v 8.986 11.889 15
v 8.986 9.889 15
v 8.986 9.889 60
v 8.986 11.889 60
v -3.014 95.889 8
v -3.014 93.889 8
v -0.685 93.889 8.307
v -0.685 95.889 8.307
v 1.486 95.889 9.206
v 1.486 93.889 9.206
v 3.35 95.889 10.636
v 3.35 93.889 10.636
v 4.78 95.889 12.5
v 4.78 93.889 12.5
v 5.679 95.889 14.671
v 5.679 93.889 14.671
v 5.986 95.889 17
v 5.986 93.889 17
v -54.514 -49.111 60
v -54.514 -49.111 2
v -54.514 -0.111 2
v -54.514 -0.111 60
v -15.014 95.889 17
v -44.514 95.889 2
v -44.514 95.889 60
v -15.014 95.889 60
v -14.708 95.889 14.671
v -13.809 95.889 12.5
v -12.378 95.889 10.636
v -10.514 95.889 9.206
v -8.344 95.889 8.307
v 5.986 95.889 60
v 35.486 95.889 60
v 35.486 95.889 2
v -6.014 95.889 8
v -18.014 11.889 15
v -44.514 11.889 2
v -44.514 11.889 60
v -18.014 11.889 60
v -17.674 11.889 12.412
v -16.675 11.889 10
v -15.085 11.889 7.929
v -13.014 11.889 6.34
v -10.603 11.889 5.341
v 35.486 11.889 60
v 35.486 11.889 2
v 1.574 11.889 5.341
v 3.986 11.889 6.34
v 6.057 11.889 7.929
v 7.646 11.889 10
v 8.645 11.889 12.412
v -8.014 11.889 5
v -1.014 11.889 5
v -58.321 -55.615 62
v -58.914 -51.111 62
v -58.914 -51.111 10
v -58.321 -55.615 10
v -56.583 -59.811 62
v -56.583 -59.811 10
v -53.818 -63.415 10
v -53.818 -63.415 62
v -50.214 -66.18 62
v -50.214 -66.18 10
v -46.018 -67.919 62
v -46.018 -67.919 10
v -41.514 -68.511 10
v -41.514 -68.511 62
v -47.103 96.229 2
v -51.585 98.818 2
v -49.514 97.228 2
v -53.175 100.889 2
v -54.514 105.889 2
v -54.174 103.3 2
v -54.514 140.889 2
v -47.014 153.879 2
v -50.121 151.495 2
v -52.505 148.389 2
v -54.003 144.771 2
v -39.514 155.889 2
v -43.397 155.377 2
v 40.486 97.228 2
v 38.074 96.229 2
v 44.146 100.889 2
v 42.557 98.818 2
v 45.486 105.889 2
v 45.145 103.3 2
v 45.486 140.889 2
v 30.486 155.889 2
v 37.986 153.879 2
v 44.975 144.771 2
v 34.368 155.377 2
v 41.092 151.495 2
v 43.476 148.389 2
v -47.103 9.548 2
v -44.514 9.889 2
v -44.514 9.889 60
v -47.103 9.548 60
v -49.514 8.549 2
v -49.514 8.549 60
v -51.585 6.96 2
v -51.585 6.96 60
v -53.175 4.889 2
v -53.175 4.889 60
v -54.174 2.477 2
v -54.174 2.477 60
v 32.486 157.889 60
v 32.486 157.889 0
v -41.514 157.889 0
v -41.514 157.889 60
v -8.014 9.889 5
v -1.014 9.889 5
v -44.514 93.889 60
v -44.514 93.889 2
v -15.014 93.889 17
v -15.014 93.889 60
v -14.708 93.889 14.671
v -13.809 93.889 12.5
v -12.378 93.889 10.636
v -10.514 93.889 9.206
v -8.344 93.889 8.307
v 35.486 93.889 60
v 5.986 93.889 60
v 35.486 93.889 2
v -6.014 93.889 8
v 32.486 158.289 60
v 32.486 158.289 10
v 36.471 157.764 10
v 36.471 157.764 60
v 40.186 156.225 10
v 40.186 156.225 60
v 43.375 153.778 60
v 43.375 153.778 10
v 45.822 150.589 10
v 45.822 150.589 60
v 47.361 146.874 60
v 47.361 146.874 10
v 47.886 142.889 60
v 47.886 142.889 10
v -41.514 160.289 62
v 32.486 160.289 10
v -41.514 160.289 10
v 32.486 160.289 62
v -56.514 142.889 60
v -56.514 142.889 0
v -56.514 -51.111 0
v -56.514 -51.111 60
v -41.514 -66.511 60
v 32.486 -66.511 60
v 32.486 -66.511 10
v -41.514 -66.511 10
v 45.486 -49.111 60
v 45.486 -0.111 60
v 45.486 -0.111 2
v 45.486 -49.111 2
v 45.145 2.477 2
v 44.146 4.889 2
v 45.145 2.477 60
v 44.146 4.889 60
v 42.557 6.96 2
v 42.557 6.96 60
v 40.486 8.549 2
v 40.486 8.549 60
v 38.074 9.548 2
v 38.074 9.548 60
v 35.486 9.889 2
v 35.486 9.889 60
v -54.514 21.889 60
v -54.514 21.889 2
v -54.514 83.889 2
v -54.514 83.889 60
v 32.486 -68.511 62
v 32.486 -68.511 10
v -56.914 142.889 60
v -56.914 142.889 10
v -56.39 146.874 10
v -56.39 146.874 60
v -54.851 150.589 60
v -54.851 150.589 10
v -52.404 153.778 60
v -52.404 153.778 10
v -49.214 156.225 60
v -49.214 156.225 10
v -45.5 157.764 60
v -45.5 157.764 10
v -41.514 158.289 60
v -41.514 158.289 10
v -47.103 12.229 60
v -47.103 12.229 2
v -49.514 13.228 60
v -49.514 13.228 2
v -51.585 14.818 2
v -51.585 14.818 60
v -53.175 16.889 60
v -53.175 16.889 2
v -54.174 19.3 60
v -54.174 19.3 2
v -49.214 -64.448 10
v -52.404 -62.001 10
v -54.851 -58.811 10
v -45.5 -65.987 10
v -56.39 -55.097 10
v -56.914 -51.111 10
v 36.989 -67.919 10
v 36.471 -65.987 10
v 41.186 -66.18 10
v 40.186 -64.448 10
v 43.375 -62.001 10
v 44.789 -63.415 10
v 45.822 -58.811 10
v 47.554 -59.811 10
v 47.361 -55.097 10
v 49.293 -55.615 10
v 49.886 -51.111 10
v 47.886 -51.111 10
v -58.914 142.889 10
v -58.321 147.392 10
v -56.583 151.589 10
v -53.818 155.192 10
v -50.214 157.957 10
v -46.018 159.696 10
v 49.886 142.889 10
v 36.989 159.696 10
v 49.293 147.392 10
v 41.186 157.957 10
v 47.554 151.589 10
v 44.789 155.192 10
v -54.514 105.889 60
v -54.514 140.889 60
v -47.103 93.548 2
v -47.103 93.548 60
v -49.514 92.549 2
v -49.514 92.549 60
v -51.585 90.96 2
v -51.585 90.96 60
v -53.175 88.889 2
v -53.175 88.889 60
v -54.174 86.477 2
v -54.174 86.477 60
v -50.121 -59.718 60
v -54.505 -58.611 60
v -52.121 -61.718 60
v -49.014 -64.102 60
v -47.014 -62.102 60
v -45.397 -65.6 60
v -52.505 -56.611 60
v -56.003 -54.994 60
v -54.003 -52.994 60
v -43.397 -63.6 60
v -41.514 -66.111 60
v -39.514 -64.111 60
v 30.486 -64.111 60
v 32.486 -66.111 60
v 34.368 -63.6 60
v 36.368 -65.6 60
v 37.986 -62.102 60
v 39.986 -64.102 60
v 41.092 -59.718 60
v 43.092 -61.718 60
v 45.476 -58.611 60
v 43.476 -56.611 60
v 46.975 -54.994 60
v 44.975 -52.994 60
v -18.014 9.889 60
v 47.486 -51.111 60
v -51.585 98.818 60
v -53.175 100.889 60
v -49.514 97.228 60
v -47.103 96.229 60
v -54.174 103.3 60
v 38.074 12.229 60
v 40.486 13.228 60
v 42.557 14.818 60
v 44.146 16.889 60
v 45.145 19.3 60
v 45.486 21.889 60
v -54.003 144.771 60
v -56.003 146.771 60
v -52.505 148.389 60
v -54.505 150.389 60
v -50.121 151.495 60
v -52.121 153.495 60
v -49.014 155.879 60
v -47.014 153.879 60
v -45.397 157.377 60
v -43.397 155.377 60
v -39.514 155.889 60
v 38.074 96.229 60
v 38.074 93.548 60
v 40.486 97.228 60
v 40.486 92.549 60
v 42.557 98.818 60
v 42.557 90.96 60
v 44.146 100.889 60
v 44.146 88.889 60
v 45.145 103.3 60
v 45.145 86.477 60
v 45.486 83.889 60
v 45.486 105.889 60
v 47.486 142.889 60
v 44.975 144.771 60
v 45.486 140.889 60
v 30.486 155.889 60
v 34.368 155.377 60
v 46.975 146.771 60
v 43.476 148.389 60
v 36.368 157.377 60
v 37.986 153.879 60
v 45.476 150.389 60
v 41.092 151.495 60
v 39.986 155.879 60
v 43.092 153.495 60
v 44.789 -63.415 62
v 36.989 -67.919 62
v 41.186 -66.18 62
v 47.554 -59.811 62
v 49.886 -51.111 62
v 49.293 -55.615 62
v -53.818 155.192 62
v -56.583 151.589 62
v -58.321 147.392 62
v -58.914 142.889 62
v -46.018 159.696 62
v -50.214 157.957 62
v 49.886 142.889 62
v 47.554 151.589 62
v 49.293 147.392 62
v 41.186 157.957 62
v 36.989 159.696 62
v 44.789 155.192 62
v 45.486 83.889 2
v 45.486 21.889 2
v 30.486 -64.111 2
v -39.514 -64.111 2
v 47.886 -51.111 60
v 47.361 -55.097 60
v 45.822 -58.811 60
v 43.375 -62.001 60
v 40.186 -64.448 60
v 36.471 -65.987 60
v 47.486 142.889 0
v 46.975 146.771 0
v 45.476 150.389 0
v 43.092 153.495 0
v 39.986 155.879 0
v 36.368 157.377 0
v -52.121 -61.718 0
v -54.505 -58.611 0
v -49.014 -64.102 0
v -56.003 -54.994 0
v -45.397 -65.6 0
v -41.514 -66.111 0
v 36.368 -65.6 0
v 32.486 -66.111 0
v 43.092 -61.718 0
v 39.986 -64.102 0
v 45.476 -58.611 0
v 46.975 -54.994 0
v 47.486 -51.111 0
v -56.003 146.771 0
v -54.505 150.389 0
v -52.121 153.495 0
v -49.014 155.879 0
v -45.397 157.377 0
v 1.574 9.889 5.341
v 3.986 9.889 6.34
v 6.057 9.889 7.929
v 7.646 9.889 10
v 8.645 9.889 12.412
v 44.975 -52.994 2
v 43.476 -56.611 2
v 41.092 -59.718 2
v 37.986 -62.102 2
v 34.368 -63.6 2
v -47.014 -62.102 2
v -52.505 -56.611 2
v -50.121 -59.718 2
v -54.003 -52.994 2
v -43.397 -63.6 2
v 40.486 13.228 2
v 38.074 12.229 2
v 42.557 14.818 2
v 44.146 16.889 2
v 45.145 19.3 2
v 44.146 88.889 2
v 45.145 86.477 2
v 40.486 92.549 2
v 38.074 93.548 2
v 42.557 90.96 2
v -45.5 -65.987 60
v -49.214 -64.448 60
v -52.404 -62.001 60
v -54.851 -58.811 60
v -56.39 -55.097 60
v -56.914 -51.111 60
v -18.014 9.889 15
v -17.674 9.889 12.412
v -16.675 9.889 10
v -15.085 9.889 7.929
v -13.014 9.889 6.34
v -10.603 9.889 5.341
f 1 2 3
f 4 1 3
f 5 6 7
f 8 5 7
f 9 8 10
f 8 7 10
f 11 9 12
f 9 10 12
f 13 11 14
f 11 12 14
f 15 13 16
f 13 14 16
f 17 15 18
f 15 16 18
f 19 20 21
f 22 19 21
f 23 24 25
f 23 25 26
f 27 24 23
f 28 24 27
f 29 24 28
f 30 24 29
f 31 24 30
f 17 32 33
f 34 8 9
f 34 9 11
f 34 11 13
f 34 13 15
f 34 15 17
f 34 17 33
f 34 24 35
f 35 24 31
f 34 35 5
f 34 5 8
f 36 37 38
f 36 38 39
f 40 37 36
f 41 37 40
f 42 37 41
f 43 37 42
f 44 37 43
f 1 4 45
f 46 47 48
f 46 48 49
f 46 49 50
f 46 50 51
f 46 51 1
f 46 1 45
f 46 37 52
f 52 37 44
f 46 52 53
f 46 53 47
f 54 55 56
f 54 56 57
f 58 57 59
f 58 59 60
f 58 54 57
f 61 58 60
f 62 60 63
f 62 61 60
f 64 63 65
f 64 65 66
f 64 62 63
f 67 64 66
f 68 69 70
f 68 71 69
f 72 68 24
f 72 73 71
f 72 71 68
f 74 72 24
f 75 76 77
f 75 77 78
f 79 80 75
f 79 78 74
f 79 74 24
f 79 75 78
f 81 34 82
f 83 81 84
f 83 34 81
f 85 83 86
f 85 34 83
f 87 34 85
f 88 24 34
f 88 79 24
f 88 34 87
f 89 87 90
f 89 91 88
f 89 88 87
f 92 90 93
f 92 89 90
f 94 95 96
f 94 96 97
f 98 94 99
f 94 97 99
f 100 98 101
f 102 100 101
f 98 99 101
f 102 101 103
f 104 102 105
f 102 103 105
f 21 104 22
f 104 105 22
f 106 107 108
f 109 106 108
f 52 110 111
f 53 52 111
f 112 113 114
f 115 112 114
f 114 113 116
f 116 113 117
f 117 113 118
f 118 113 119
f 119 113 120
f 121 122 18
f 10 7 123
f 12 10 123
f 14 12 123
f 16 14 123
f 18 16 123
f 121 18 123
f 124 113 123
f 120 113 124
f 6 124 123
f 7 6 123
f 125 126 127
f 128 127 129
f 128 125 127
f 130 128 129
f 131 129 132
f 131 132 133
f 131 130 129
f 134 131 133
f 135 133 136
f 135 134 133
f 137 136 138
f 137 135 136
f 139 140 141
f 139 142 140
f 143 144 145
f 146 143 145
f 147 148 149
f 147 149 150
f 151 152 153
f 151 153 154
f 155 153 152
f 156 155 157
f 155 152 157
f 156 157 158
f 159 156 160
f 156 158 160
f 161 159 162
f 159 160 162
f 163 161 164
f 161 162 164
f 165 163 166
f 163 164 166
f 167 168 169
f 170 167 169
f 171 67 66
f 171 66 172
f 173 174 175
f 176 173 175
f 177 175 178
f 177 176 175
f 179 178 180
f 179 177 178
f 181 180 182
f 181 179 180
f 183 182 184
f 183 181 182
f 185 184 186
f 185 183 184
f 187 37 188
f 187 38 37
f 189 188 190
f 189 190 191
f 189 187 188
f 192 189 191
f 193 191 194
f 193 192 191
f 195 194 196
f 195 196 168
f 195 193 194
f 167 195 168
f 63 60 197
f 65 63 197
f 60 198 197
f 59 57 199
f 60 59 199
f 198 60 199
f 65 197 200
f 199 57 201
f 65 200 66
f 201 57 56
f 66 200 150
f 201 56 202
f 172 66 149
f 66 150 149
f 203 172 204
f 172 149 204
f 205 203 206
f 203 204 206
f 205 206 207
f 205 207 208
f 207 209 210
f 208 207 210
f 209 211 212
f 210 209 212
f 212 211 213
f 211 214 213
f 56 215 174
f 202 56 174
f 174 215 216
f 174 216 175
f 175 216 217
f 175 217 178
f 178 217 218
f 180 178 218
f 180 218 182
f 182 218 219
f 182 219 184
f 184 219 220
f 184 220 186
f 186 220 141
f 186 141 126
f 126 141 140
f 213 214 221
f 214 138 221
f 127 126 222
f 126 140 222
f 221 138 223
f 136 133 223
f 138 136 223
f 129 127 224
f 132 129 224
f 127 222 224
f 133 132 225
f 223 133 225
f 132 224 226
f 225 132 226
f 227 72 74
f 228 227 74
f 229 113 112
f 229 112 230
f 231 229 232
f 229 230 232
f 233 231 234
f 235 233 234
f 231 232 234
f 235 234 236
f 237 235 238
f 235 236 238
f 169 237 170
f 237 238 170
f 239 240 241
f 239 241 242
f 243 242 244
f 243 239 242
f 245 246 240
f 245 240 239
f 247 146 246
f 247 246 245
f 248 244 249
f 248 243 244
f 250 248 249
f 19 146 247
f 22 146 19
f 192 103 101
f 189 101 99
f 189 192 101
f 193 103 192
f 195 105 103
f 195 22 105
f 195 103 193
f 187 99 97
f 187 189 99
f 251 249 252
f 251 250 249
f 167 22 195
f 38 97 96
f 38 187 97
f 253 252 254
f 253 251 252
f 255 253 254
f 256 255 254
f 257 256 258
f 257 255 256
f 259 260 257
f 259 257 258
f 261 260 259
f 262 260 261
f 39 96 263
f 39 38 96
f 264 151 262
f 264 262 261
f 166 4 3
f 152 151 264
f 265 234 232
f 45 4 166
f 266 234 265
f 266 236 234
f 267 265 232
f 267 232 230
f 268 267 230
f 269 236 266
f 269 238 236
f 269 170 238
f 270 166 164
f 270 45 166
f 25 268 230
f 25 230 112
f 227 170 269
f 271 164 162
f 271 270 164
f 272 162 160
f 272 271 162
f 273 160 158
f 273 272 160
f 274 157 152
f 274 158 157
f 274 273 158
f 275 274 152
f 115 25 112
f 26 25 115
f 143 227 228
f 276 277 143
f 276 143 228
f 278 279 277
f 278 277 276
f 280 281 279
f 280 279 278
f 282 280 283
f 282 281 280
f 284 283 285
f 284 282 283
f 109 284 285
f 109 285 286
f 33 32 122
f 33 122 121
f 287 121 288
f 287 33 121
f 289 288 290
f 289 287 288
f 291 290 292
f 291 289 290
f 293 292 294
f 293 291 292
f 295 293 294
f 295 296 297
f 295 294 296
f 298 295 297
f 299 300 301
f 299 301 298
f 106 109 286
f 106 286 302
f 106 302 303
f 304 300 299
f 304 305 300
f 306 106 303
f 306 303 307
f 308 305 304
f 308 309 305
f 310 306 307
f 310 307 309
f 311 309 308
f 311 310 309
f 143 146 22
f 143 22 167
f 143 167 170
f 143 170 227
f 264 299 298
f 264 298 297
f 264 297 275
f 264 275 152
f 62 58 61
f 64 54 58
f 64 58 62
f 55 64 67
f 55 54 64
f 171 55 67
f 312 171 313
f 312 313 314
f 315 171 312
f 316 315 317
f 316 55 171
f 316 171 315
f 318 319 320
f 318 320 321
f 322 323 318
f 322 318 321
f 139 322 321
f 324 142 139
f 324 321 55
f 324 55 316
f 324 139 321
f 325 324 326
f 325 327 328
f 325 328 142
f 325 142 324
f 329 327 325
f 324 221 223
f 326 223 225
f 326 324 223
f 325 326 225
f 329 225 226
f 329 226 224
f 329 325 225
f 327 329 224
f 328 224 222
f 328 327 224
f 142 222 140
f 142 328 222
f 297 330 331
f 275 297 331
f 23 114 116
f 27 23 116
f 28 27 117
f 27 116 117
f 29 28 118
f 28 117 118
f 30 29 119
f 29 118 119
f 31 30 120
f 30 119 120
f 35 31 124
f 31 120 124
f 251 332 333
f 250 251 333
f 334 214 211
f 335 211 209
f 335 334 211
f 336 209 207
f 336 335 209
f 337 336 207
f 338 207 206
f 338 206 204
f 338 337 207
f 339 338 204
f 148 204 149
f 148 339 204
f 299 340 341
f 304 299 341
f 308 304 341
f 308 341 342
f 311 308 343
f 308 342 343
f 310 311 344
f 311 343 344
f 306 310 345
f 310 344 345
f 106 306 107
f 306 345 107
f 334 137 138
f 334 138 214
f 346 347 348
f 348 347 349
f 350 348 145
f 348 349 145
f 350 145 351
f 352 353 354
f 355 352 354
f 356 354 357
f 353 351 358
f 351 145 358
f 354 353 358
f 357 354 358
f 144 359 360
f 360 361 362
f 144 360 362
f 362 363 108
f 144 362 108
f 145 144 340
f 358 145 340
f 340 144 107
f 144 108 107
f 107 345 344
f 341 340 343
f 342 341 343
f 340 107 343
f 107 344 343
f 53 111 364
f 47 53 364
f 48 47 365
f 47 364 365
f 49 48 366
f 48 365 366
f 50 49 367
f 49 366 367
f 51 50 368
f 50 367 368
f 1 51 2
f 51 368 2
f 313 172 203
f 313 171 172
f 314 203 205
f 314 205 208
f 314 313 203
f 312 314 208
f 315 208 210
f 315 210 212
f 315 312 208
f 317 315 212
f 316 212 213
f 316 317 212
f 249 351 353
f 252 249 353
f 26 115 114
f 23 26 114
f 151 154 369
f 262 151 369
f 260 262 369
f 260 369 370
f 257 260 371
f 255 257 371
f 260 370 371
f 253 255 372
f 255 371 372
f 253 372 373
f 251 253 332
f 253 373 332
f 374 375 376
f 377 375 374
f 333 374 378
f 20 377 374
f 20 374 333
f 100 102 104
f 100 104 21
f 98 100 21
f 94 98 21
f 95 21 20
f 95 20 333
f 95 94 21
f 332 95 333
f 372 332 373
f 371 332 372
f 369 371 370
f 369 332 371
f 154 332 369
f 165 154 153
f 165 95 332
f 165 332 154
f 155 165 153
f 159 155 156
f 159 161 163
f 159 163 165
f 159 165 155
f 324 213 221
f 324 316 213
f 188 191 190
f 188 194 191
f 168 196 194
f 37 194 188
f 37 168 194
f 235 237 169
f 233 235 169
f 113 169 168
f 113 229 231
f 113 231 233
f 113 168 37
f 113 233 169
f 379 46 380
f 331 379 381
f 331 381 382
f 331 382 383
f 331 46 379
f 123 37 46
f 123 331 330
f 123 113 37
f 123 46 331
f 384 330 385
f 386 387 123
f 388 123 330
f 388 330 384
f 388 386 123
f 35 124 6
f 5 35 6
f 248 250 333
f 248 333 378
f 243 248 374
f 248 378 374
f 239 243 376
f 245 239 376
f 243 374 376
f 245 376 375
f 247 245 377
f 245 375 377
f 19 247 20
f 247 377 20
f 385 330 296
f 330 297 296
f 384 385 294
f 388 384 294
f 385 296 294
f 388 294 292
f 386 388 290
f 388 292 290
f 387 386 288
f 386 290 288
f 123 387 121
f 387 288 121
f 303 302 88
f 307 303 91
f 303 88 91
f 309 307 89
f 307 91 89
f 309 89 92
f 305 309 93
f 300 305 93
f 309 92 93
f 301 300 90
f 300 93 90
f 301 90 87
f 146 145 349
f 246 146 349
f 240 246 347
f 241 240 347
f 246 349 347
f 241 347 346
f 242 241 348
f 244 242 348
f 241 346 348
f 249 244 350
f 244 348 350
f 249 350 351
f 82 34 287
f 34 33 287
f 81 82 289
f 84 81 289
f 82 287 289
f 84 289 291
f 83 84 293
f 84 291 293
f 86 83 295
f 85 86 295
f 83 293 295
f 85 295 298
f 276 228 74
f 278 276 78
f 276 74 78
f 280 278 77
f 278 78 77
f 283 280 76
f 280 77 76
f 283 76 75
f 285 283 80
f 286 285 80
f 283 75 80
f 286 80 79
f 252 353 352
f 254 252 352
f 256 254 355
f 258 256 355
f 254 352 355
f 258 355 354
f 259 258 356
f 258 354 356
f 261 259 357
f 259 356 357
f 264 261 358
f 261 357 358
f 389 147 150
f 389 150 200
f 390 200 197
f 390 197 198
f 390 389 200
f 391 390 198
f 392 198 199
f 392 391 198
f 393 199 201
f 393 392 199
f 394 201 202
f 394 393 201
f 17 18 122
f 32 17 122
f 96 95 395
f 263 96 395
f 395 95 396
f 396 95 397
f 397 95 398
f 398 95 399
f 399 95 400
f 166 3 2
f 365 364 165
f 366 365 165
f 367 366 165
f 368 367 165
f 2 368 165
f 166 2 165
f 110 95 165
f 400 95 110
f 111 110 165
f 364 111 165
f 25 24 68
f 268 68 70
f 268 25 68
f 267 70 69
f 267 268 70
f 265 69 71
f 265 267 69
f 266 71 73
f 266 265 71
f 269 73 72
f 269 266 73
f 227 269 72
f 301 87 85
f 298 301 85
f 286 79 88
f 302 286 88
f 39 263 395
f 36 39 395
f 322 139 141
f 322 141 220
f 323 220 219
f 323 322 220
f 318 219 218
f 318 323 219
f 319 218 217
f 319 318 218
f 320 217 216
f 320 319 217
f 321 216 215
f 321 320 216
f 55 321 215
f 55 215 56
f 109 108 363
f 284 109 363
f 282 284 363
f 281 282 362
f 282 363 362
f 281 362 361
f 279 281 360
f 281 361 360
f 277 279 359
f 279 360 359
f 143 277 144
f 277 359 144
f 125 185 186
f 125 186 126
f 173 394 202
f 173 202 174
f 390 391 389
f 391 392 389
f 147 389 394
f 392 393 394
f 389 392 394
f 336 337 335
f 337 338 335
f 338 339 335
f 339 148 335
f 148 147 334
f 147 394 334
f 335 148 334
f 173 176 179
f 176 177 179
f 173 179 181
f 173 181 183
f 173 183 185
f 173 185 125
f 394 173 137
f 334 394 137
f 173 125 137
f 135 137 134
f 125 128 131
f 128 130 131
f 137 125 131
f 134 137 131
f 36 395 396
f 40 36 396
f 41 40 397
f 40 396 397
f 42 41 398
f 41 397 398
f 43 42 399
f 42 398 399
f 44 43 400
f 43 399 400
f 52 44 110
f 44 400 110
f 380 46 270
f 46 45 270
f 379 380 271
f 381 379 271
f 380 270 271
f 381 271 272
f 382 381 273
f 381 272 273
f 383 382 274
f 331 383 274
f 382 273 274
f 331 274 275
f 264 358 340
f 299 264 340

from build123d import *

# Parameters (mm, degrees)
F0_W      = 100
F0_H      = 2
F1_DEPTH  = 60
F0_H_2    = 82
F2_DEPTH  = 2
F4_DEPTH  = 2
F6_DEPTH  = 2
F7_R      = 10
F9_DEPTH  = 2
F10_DEPTH = 50


with BuildPart() as f1:
    # F0 (on Top) → F1 (new body)
    with BuildSketch(Plane.XY):
        with BuildLine():
            ThreePointArc((-41.5143723786, 157.8886009157), (-52.1209740964, 153.4952026335), (-56.5143723786, 142.8886009157))
            Line((-56.5143723786, 142.8886009157), (-56.5143723786, -51.1113990843))
            ThreePointArc((-56.5143723786, -51.1113990843), (-52.1209740964, -61.7180008021), (-41.5143723786, -66.1113990843))
            Line((-41.5143723786, -66.1113990843), (32.4856276214, -66.1113990843))
            ThreePointArc((32.4856276214, -66.1113990843), (43.0922293392, -61.7180008021), (47.4856276214, -51.1113990843))
            Line((47.4856276214, -51.1113990843), (47.4856276214, 142.8886009157))
            ThreePointArc((47.4856276214, 142.8886009157), (43.0922293392, 153.4952026335), (32.4856276214, 157.8886009157))
            Line((32.4856276214, 157.8886009157), (-41.5143723786, 157.8886009157))
        make_face()
        with BuildLine():
            ThreePointArc((-54.5143723786, 140.8886009157), (-50.1209740964, 151.4952026335), (-39.5143723786, 155.8886009157))
            Line((-39.5143723786, 155.8886009157), (30.4856276214, 155.8886009157))
            ThreePointArc((30.4856276214, 155.8886009157), (41.0922293392, 151.4952026335), (45.4856276214, 140.8886009157))
            Line((45.4856276214, 140.8886009157), (45.4856276214, 95.8886009157))
            Line((45.4856276214, 95.8886009157), (45.4856276214, 93.8886009157))
            Line((45.4856276214, 93.8886009157), (45.4856276214, 11.8886009157))
            Line((45.4856276214, 11.8886009157), (45.4856276214, 9.8886009157))
            Line((45.4856276214, 9.8886009157), (45.4856276214, -49.1113990843))
            ThreePointArc((45.4856276214, -49.1113990843), (41.0922293392, -59.7180008021), (30.4856276214, -64.1113990843))
            Line((30.4856276214, -64.1113990843), (-39.5143723786, -64.1113990843))
            ThreePointArc((-39.5143723786, -64.1113990843), (-50.1209740964, -59.7180008021), (-54.5143723786, -49.1113990843))
            Line((-54.5143723786, -49.1113990843), (-54.5143723786, 9.8886009157))
            Line((-54.5143723786, 9.8886009157), (-54.5143723786, 11.8886009157))
            Line((-54.5143723786, 11.8886009157), (-54.5143723786, 93.8886009157))
            Line((-54.5143723786, 93.8886009157), (-54.5143723786, 95.8886009157))
            Line((-54.5143723786, 95.8886009157), (-54.5143723786, 140.8886009157))
        make_face(mode=Mode.SUBTRACT)
        with Locations((-4.5143723786, 94.8886009157)):
            Rectangle(F0_W, F0_H)
        with Locations((-4.5143723786, 10.8886009157)):
            Rectangle(F0_W, F0_H)
    extrude(amount=F1_DEPTH)

    # F0 (on Top) → F2 (join)
    with BuildSketch(Plane.XY):
        with BuildLine():
            Line((30.4856276214, 155.8886009157), (-39.5143723786, 155.8886009157))
            ThreePointArc((-39.5143723786, 155.8886009157), (-50.1209740964, 151.4952026335), (-54.5143723786, 140.8886009157))
            Line((-54.5143723786, 140.8886009157), (-54.5143723786, 95.8886009157))
            Line((-54.5143723786, 95.8886009157), (45.4856276214, 95.8886009157))
            Line((45.4856276214, 95.8886009157), (45.4856276214, 140.8886009157))
            ThreePointArc((45.4856276214, 140.8886009157), (41.0922293392, 151.4952026335), (30.4856276214, 155.8886009157))
        make_face()
        with Locations((-4.5143723786, 52.8886009157)):
            Rectangle(F0_W, F0_H_2)
        with BuildLine():
            Line((45.4856276214, 9.8886009157), (-54.5143723786, 9.8886009157))
            Line((-54.5143723786, 9.8886009157), (-54.5143723786, -49.1113990843))
            ThreePointArc((-54.5143723786, -49.1113990843), (-50.1209740964, -59.7180008021), (-39.5143723786, -64.1113990843))
            Line((-39.5143723786, -64.1113990843), (30.4856276214, -64.1113990843))
            ThreePointArc((30.4856276214, -64.1113990843), (41.0922293392, -59.7180008021), (45.4856276214, -49.1113990843))
            Line((45.4856276214, -49.1113990843), (45.4856276214, 9.8886009157))
        make_face()
    extrude(amount=F2_DEPTH)

    # F3 (on face) → F4 (cut, through all)
    with BuildSketch(Plane.XZ.offset(-9.8886009157)):
        with BuildLine():
            Line((8.9856276214, 60), (-18.0143723786, 60))
            Line((-18.0143723786, 60), (-18.0143723786, 15))
            ThreePointArc((-18.0143723786, 15), (-15.0854401905, 7.9289321881), (-8.0143723786, 5))
            Line((-8.0143723786, 5), (-1.0143723786, 5))
            ThreePointArc((-1.0143723786, 5), (6.0566954333, 7.9289321881), (8.9856276214, 15))
            Line((8.9856276214, 15), (8.9856276214, 60))
        make_face()
    extrude(amount=-F4_DEPTH, mode=Mode.SUBTRACT)

    # F5 (on face) → F6 (cut, through all)
    with BuildSketch(Plane.XZ.offset(-93.8886009157)):
        with BuildLine():
            Line((5.9856276214, 60), (-15.0143723786, 60))
            Line((-15.0143723786, 60), (-15.0143723786, 17))
            ThreePointArc((-15.0143723786, 17), (-12.3783334093, 10.6360389693), (-6.0143723786, 8))
            Line((-6.0143723786, 8), (-3.0143723786, 8))
            ThreePointArc((-3.0143723786, 8), (3.3495886521, 10.6360389693), (5.9856276214, 17))
            Line((5.9856276214, 17), (5.9856276214, 60))
        make_face()
    extrude(amount=-F6_DEPTH, mode=Mode.SUBTRACT)

    # F7
    f7_edges = [f1.edges().sort_by_distance(p)[0] for p in [
        (-54.514372, 9.888601, 31),
        (45.485628, 9.888601, 31),
        (-54.514372, 11.888601, 31),
        (45.485628, 11.888601, 31),
        (-54.514372, 93.888601, 31),
        (45.485628, 93.888601, 31),
        (45.485628, 95.888601, 31),
        (-54.514372, 95.888601, 31),
    ]]
    fillet(f7_edges, radius=F7_R)


with BuildPart() as f9:
    # F8 (on face) → F9 (new body)
    with BuildSketch(Plane.XY.offset(60)):
        with BuildLine():
            Line((32.4856276214, 160.2886009157), (-41.5143723786, 160.2886009157))
            ThreePointArc((-41.5143723786, 160.2886009157), (-53.8180303712, 155.1922589083), (-58.9143723786, 142.8886009157))
            Line((-58.9143723786, 142.8886009157), (-58.9143723786, -51.1113990843))
            ThreePointArc((-58.9143723786, -51.1113990843), (-53.8180303712, -63.415057077), (-41.5143723786, -68.5113990843))
            Line((-41.5143723786, -68.5113990843), (32.4856276214, -68.5113990843))
            ThreePointArc((32.4856276214, -68.5113990843), (44.7892856141, -63.415057077), (49.8856276214, -51.1113990843))
            Line((49.8856276214, -51.1113990843), (49.8856276214, 142.8886009157))
            ThreePointArc((49.8856276214, 142.8886009157), (44.7892856141, 155.1922589083), (32.4856276214, 160.2886009157))
        make_face()
        with BuildLine():
            ThreePointArc((-56.9143723786, 142.8886009157), (-52.4038168089, 153.7780453459), (-41.5143723786, 158.2886009157))
            Line((-41.5143723786, 158.2886009157), (32.4856276214, 158.2886009157))
            ThreePointArc((32.4856276214, 158.2886009157), (43.3750720517, 153.7780453459), (47.8856276214, 142.8886009157))
            Line((47.8856276214, 142.8886009157), (47.8856276214, -51.1113990843))
            ThreePointArc((47.8856276214, -51.1113990843), (43.3750720517, -62.0008435146), (32.4856276214, -66.5113990843))
            Line((32.4856276214, -66.5113990843), (-41.5143723786, -66.5113990843))
            ThreePointArc((-41.5143723786, -66.5113990843), (-52.4038168089, -62.0008435146), (-56.9143723786, -51.1113990843))
            Line((-56.9143723786, -51.1113990843), (-56.9143723786, 142.8886009157))
        make_face(mode=Mode.SUBTRACT)
        with BuildLine():
            Line((32.4856276214, 158.2886009157), (-41.5143723786, 158.2886009157))
            ThreePointArc((-41.5143723786, 158.2886009157), (-52.4038168089, 153.7780453459), (-56.9143723786, 142.8886009157))
            Line((-56.9143723786, 142.8886009157), (-56.9143723786, -51.1113990843))
            ThreePointArc((-56.9143723786, -51.1113990843), (-52.4038168089, -62.0008435146), (-41.5143723786, -66.5113990843))
            Line((-41.5143723786, -66.5113990843), (32.4856276214, -66.5113990843))
            ThreePointArc((32.4856276214, -66.5113990843), (43.3750720517, -62.0008435146), (47.8856276214, -51.1113990843))
            Line((47.8856276214, -51.1113990843), (47.8856276214, 142.8886009157))
            ThreePointArc((47.8856276214, 142.8886009157), (43.3750720517, 153.7780453459), (32.4856276214, 158.2886009157))
        make_face()
        with BuildLine():
            Line((-41.5143723786, 157.8886009157), (32.4856276214, 157.8886009157))
            ThreePointArc((32.4856276214, 157.8886009157), (43.0922293392, 153.4952026335), (47.4856276214, 142.8886009157))
            Line((47.4856276214, 142.8886009157), (47.4856276214, -51.1113990843))
            ThreePointArc((47.4856276214, -51.1113990843), (43.0922293392, -61.7180008021), (32.4856276214, -66.1113990843))
            Line((32.4856276214, -66.1113990843), (-41.5143723786, -66.1113990843))
            ThreePointArc((-41.5143723786, -66.1113990843), (-52.1209740964, -61.7180008021), (-56.5143723786, -51.1113990843))
            Line((-56.5143723786, -51.1113990843), (-56.5143723786, 142.8886009157))
            ThreePointArc((-56.5143723786, 142.8886009157), (-52.1209740964, 153.4952026335), (-41.5143723786, 157.8886009157))
        make_face(mode=Mode.SUBTRACT)
        with BuildLine():
            ThreePointArc((47.4856276214, 142.8886009157), (43.0922293392, 153.4952026335), (32.4856276214, 157.8886009157))
            Line((32.4856276214, 157.8886009157), (-41.5143723786, 157.8886009157))
            ThreePointArc((-41.5143723786, 157.8886009157), (-52.1209740964, 153.4952026335), (-56.5143723786, 142.8886009157))
            Line((-56.5143723786, 142.8886009157), (-56.5143723786, -51.1113990843))
            ThreePointArc((-56.5143723786, -51.1113990843), (-52.1209740964, -61.7180008021), (-41.5143723786, -66.1113990843))
            Line((-41.5143723786, -66.1113990843), (32.4856276214, -66.1113990843))
            ThreePointArc((32.4856276214, -66.1113990843), (43.0922293392, -61.7180008021), (47.4856276214, -51.1113990843))
            Line((47.4856276214, -51.1113990843), (47.4856276214, 142.8886009157))
        make_face()
        with BuildLine():
            ThreePointArc((35.4856276214, 9.8886009157), (42.5566954333, 6.9596687275), (45.4856276214, -0.1113990843))
            Line((45.4856276214, -0.1113990843), (45.4856276214, -49.1113990843))
            ThreePointArc((45.4856276214, -49.1113990843), (41.0922293392, -59.7180008021), (30.4856276214, -64.1113990843))
            Line((30.4856276214, -64.1113990843), (-39.5143723786, -64.1113990843))
            ThreePointArc((-39.5143723786, -64.1113990843), (-50.1209740964, -59.7180008021), (-54.5143723786, -49.1113990843))
            Line((-54.5143723786, -49.1113990843), (-54.5143723786, -0.1113990843))
            ThreePointArc((-54.5143723786, -0.1113990843), (-51.5854401905, 6.9596687275), (-44.5143723786, 9.8886009157))
            Line((-44.5143723786, 9.8886009157), (-18.0143723786, 9.8886009157))
            Line((-18.0143723786, 9.8886009157), (-18.0143723786, 11.8886009157))
            Line((-18.0143723786, 11.8886009157), (-44.5143723786, 11.8886009157))
            ThreePointArc((-44.5143723786, 11.8886009157), (-51.5854401905, 14.8175331038), (-54.5143723786, 21.8886009157))
            Line((-54.5143723786, 21.8886009157), (-54.5143723786, 83.8886009157))
            ThreePointArc((-54.5143723786, 83.8886009157), (-51.5854401905, 90.9596687275), (-44.5143723786, 93.8886009157))
            Line((-44.5143723786, 93.8886009157), (-15.0143723786, 93.8886009157))
            Line((-15.0143723786, 93.8886009157), (-15.0143723786, 95.8886009157))
            Line((-15.0143723786, 95.8886009157), (-44.5143723786, 95.8886009157))
            ThreePointArc((-44.5143723786, 95.8886009157), (-51.5854401905, 98.8175331038), (-54.5143723786, 105.8886009157))
            Line((-54.5143723786, 105.8886009157), (-54.5143723786, 140.8886009157))
            ThreePointArc((-54.5143723786, 140.8886009157), (-50.1209740964, 151.4952026335), (-39.5143723786, 155.8886009157))
            Line((-39.5143723786, 155.8886009157), (30.4856276214, 155.8886009157))
            ThreePointArc((30.4856276214, 155.8886009157), (41.0922293392, 151.4952026335), (45.4856276214, 140.8886009157))
            Line((45.4856276214, 140.8886009157), (45.4856276214, 105.8886009157))
            ThreePointArc((45.4856276214, 105.8886009157), (42.5566954333, 98.8175331038), (35.4856276214, 95.8886009157))
            Line((35.4856276214, 95.8886009157), (5.9856276214, 95.8886009157))
            Line((5.9856276214, 95.8886009157), (5.9856276214, 93.8886009157))
            Line((5.9856276214, 93.8886009157), (35.4856276214, 93.8886009157))
            ThreePointArc((35.4856276214, 93.8886009157), (42.5566954333, 90.9596687275), (45.4856276214, 83.8886009157))
            Line((45.4856276214, 83.8886009157), (45.4856276214, 21.8886009157))
            ThreePointArc((45.4856276214, 21.8886009157), (42.5566954333, 14.8175331038), (35.4856276214, 11.8886009157))
            Line((35.4856276214, 11.8886009157), (8.9856276214, 11.8886009157))
            Line((8.9856276214, 11.8886009157), (8.9856276214, 9.8886009157))
            Line((8.9856276214, 9.8886009157), (35.4856276214, 9.8886009157))
        make_face(mode=Mode.SUBTRACT)
        with BuildLine():
            Line((45.4856276214, -49.1113990843), (45.4856276214, -0.1113990843))
            ThreePointArc((45.4856276214, -0.1113990843), (42.5566954333, 6.9596687275), (35.4856276214, 9.8886009157))
            Line((35.4856276214, 9.8886009157), (8.9856276214, 9.8886009157))
            Line((8.9856276214, 9.8886009157), (8.9856276214, 11.8886009157))
            Line((8.9856276214, 11.8886009157), (35.4856276214, 11.8886009157))
            ThreePointArc((35.4856276214, 11.8886009157), (42.5566954333, 14.8175331038), (45.4856276214, 21.8886009157))
            Line((45.4856276214, 21.8886009157), (45.4856276214, 83.8886009157))
            ThreePointArc((45.4856276214, 83.8886009157), (42.5566954333, 90.9596687275), (35.4856276214, 93.8886009157))
            Line((35.4856276214, 93.8886009157), (5.9856276214, 93.8886009157))
            Line((5.9856276214, 93.8886009157), (5.9856276214, 95.8886009157))
            Line((5.9856276214, 95.8886009157), (35.4856276214, 95.8886009157))
            ThreePointArc((35.4856276214, 95.8886009157), (42.5566954333, 98.8175331038), (45.4856276214, 105.8886009157))
            Line((45.4856276214, 105.8886009157), (45.4856276214, 140.8886009157))
            ThreePointArc((45.4856276214, 140.8886009157), (41.0922293392, 151.4952026335), (30.4856276214, 155.8886009157))
            Line((30.4856276214, 155.8886009157), (-39.5143723786, 155.8886009157))
            ThreePointArc((-39.5143723786, 155.8886009157), (-50.1209740964, 151.4952026335), (-54.5143723786, 140.8886009157))
            Line((-54.5143723786, 140.8886009157), (-54.5143723786, 105.8886009157))
            ThreePointArc((-54.5143723786, 105.8886009157), (-51.5854401905, 98.8175331038), (-44.5143723786, 95.8886009157))
            Line((-44.5143723786, 95.8886009157), (-15.0143723786, 95.8886009157))
            Line((-15.0143723786, 95.8886009157), (-15.0143723786, 93.8886009157))
            Line((-15.0143723786, 93.8886009157), (-44.5143723786, 93.8886009157))
            ThreePointArc((-44.5143723786, 93.8886009157), (-51.5854401905, 90.9596687275), (-54.5143723786, 83.8886009157))
            Line((-54.5143723786, 83.8886009157), (-54.5143723786, 21.8886009157))
            ThreePointArc((-54.5143723786, 21.8886009157), (-51.5854401905, 14.8175331038), (-44.5143723786, 11.8886009157))
            Line((-44.5143723786, 11.8886009157), (-18.0143723786, 11.8886009157))
            Line((-18.0143723786, 11.8886009157), (-18.0143723786, 9.8886009157))
            Line((-18.0143723786, 9.8886009157), (-44.5143723786, 9.8886009157))
            ThreePointArc((-44.5143723786, 9.8886009157), (-51.5854401905, 6.9596687275), (-54.5143723786, -0.1113990843))
            Line((-54.5143723786, -0.1113990843), (-54.5143723786, -49.1113990843))
            ThreePointArc((-54.5143723786, -49.1113990843), (-50.1209740964, -59.7180008021), (-39.5143723786, -64.1113990843))
            Line((-39.5143723786, -64.1113990843), (30.4856276214, -64.1113990843))
            ThreePointArc((30.4856276214, -64.1113990843), (41.0922293392, -59.7180008021), (45.4856276214, -49.1113990843))
        make_face()
    extrude(amount=F9_DEPTH)

    # F8 (on face) → F10 (join)
    with BuildSketch(Plane.XY.offset(60)):
        with BuildLine():
            Line((32.4856276214, 160.2886009157), (-41.5143723786, 160.2886009157))
            ThreePointArc((-41.5143723786, 160.2886009157), (-53.8180303712, 155.1922589083), (-58.9143723786, 142.8886009157))
            Line((-58.9143723786, 142.8886009157), (-58.9143723786, -51.1113990843))
            ThreePointArc((-58.9143723786, -51.1113990843), (-53.8180303712, -63.415057077), (-41.5143723786, -68.5113990843))
            Line((-41.5143723786, -68.5113990843), (32.4856276214, -68.5113990843))
            ThreePointArc((32.4856276214, -68.5113990843), (44.7892856141, -63.415057077), (49.8856276214, -51.1113990843))
            Line((49.8856276214, -51.1113990843), (49.8856276214, 142.8886009157))
            ThreePointArc((49.8856276214, 142.8886009157), (44.7892856141, 155.1922589083), (32.4856276214, 160.2886009157))
        make_face()
        with BuildLine():
            ThreePointArc((-56.9143723786, 142.8886009157), (-52.4038168089, 153.7780453459), (-41.5143723786, 158.2886009157))
            Line((-41.5143723786, 158.2886009157), (32.4856276214, 158.2886009157))
            ThreePointArc((32.4856276214, 158.2886009157), (43.3750720517, 153.7780453459), (47.8856276214, 142.8886009157))
            Line((47.8856276214, 142.8886009157), (47.8856276214, -51.1113990843))
            ThreePointArc((47.8856276214, -51.1113990843), (43.3750720517, -62.0008435146), (32.4856276214, -66.5113990843))
            Line((32.4856276214, -66.5113990843), (-41.5143723786, -66.5113990843))
            ThreePointArc((-41.5143723786, -66.5113990843), (-52.4038168089, -62.0008435146), (-56.9143723786, -51.1113990843))
            Line((-56.9143723786, -51.1113990843), (-56.9143723786, 142.8886009157))
        make_face(mode=Mode.SUBTRACT)
    extrude(amount=-F10_DEPTH)


solid = Compound([f1.part, f9.part])
